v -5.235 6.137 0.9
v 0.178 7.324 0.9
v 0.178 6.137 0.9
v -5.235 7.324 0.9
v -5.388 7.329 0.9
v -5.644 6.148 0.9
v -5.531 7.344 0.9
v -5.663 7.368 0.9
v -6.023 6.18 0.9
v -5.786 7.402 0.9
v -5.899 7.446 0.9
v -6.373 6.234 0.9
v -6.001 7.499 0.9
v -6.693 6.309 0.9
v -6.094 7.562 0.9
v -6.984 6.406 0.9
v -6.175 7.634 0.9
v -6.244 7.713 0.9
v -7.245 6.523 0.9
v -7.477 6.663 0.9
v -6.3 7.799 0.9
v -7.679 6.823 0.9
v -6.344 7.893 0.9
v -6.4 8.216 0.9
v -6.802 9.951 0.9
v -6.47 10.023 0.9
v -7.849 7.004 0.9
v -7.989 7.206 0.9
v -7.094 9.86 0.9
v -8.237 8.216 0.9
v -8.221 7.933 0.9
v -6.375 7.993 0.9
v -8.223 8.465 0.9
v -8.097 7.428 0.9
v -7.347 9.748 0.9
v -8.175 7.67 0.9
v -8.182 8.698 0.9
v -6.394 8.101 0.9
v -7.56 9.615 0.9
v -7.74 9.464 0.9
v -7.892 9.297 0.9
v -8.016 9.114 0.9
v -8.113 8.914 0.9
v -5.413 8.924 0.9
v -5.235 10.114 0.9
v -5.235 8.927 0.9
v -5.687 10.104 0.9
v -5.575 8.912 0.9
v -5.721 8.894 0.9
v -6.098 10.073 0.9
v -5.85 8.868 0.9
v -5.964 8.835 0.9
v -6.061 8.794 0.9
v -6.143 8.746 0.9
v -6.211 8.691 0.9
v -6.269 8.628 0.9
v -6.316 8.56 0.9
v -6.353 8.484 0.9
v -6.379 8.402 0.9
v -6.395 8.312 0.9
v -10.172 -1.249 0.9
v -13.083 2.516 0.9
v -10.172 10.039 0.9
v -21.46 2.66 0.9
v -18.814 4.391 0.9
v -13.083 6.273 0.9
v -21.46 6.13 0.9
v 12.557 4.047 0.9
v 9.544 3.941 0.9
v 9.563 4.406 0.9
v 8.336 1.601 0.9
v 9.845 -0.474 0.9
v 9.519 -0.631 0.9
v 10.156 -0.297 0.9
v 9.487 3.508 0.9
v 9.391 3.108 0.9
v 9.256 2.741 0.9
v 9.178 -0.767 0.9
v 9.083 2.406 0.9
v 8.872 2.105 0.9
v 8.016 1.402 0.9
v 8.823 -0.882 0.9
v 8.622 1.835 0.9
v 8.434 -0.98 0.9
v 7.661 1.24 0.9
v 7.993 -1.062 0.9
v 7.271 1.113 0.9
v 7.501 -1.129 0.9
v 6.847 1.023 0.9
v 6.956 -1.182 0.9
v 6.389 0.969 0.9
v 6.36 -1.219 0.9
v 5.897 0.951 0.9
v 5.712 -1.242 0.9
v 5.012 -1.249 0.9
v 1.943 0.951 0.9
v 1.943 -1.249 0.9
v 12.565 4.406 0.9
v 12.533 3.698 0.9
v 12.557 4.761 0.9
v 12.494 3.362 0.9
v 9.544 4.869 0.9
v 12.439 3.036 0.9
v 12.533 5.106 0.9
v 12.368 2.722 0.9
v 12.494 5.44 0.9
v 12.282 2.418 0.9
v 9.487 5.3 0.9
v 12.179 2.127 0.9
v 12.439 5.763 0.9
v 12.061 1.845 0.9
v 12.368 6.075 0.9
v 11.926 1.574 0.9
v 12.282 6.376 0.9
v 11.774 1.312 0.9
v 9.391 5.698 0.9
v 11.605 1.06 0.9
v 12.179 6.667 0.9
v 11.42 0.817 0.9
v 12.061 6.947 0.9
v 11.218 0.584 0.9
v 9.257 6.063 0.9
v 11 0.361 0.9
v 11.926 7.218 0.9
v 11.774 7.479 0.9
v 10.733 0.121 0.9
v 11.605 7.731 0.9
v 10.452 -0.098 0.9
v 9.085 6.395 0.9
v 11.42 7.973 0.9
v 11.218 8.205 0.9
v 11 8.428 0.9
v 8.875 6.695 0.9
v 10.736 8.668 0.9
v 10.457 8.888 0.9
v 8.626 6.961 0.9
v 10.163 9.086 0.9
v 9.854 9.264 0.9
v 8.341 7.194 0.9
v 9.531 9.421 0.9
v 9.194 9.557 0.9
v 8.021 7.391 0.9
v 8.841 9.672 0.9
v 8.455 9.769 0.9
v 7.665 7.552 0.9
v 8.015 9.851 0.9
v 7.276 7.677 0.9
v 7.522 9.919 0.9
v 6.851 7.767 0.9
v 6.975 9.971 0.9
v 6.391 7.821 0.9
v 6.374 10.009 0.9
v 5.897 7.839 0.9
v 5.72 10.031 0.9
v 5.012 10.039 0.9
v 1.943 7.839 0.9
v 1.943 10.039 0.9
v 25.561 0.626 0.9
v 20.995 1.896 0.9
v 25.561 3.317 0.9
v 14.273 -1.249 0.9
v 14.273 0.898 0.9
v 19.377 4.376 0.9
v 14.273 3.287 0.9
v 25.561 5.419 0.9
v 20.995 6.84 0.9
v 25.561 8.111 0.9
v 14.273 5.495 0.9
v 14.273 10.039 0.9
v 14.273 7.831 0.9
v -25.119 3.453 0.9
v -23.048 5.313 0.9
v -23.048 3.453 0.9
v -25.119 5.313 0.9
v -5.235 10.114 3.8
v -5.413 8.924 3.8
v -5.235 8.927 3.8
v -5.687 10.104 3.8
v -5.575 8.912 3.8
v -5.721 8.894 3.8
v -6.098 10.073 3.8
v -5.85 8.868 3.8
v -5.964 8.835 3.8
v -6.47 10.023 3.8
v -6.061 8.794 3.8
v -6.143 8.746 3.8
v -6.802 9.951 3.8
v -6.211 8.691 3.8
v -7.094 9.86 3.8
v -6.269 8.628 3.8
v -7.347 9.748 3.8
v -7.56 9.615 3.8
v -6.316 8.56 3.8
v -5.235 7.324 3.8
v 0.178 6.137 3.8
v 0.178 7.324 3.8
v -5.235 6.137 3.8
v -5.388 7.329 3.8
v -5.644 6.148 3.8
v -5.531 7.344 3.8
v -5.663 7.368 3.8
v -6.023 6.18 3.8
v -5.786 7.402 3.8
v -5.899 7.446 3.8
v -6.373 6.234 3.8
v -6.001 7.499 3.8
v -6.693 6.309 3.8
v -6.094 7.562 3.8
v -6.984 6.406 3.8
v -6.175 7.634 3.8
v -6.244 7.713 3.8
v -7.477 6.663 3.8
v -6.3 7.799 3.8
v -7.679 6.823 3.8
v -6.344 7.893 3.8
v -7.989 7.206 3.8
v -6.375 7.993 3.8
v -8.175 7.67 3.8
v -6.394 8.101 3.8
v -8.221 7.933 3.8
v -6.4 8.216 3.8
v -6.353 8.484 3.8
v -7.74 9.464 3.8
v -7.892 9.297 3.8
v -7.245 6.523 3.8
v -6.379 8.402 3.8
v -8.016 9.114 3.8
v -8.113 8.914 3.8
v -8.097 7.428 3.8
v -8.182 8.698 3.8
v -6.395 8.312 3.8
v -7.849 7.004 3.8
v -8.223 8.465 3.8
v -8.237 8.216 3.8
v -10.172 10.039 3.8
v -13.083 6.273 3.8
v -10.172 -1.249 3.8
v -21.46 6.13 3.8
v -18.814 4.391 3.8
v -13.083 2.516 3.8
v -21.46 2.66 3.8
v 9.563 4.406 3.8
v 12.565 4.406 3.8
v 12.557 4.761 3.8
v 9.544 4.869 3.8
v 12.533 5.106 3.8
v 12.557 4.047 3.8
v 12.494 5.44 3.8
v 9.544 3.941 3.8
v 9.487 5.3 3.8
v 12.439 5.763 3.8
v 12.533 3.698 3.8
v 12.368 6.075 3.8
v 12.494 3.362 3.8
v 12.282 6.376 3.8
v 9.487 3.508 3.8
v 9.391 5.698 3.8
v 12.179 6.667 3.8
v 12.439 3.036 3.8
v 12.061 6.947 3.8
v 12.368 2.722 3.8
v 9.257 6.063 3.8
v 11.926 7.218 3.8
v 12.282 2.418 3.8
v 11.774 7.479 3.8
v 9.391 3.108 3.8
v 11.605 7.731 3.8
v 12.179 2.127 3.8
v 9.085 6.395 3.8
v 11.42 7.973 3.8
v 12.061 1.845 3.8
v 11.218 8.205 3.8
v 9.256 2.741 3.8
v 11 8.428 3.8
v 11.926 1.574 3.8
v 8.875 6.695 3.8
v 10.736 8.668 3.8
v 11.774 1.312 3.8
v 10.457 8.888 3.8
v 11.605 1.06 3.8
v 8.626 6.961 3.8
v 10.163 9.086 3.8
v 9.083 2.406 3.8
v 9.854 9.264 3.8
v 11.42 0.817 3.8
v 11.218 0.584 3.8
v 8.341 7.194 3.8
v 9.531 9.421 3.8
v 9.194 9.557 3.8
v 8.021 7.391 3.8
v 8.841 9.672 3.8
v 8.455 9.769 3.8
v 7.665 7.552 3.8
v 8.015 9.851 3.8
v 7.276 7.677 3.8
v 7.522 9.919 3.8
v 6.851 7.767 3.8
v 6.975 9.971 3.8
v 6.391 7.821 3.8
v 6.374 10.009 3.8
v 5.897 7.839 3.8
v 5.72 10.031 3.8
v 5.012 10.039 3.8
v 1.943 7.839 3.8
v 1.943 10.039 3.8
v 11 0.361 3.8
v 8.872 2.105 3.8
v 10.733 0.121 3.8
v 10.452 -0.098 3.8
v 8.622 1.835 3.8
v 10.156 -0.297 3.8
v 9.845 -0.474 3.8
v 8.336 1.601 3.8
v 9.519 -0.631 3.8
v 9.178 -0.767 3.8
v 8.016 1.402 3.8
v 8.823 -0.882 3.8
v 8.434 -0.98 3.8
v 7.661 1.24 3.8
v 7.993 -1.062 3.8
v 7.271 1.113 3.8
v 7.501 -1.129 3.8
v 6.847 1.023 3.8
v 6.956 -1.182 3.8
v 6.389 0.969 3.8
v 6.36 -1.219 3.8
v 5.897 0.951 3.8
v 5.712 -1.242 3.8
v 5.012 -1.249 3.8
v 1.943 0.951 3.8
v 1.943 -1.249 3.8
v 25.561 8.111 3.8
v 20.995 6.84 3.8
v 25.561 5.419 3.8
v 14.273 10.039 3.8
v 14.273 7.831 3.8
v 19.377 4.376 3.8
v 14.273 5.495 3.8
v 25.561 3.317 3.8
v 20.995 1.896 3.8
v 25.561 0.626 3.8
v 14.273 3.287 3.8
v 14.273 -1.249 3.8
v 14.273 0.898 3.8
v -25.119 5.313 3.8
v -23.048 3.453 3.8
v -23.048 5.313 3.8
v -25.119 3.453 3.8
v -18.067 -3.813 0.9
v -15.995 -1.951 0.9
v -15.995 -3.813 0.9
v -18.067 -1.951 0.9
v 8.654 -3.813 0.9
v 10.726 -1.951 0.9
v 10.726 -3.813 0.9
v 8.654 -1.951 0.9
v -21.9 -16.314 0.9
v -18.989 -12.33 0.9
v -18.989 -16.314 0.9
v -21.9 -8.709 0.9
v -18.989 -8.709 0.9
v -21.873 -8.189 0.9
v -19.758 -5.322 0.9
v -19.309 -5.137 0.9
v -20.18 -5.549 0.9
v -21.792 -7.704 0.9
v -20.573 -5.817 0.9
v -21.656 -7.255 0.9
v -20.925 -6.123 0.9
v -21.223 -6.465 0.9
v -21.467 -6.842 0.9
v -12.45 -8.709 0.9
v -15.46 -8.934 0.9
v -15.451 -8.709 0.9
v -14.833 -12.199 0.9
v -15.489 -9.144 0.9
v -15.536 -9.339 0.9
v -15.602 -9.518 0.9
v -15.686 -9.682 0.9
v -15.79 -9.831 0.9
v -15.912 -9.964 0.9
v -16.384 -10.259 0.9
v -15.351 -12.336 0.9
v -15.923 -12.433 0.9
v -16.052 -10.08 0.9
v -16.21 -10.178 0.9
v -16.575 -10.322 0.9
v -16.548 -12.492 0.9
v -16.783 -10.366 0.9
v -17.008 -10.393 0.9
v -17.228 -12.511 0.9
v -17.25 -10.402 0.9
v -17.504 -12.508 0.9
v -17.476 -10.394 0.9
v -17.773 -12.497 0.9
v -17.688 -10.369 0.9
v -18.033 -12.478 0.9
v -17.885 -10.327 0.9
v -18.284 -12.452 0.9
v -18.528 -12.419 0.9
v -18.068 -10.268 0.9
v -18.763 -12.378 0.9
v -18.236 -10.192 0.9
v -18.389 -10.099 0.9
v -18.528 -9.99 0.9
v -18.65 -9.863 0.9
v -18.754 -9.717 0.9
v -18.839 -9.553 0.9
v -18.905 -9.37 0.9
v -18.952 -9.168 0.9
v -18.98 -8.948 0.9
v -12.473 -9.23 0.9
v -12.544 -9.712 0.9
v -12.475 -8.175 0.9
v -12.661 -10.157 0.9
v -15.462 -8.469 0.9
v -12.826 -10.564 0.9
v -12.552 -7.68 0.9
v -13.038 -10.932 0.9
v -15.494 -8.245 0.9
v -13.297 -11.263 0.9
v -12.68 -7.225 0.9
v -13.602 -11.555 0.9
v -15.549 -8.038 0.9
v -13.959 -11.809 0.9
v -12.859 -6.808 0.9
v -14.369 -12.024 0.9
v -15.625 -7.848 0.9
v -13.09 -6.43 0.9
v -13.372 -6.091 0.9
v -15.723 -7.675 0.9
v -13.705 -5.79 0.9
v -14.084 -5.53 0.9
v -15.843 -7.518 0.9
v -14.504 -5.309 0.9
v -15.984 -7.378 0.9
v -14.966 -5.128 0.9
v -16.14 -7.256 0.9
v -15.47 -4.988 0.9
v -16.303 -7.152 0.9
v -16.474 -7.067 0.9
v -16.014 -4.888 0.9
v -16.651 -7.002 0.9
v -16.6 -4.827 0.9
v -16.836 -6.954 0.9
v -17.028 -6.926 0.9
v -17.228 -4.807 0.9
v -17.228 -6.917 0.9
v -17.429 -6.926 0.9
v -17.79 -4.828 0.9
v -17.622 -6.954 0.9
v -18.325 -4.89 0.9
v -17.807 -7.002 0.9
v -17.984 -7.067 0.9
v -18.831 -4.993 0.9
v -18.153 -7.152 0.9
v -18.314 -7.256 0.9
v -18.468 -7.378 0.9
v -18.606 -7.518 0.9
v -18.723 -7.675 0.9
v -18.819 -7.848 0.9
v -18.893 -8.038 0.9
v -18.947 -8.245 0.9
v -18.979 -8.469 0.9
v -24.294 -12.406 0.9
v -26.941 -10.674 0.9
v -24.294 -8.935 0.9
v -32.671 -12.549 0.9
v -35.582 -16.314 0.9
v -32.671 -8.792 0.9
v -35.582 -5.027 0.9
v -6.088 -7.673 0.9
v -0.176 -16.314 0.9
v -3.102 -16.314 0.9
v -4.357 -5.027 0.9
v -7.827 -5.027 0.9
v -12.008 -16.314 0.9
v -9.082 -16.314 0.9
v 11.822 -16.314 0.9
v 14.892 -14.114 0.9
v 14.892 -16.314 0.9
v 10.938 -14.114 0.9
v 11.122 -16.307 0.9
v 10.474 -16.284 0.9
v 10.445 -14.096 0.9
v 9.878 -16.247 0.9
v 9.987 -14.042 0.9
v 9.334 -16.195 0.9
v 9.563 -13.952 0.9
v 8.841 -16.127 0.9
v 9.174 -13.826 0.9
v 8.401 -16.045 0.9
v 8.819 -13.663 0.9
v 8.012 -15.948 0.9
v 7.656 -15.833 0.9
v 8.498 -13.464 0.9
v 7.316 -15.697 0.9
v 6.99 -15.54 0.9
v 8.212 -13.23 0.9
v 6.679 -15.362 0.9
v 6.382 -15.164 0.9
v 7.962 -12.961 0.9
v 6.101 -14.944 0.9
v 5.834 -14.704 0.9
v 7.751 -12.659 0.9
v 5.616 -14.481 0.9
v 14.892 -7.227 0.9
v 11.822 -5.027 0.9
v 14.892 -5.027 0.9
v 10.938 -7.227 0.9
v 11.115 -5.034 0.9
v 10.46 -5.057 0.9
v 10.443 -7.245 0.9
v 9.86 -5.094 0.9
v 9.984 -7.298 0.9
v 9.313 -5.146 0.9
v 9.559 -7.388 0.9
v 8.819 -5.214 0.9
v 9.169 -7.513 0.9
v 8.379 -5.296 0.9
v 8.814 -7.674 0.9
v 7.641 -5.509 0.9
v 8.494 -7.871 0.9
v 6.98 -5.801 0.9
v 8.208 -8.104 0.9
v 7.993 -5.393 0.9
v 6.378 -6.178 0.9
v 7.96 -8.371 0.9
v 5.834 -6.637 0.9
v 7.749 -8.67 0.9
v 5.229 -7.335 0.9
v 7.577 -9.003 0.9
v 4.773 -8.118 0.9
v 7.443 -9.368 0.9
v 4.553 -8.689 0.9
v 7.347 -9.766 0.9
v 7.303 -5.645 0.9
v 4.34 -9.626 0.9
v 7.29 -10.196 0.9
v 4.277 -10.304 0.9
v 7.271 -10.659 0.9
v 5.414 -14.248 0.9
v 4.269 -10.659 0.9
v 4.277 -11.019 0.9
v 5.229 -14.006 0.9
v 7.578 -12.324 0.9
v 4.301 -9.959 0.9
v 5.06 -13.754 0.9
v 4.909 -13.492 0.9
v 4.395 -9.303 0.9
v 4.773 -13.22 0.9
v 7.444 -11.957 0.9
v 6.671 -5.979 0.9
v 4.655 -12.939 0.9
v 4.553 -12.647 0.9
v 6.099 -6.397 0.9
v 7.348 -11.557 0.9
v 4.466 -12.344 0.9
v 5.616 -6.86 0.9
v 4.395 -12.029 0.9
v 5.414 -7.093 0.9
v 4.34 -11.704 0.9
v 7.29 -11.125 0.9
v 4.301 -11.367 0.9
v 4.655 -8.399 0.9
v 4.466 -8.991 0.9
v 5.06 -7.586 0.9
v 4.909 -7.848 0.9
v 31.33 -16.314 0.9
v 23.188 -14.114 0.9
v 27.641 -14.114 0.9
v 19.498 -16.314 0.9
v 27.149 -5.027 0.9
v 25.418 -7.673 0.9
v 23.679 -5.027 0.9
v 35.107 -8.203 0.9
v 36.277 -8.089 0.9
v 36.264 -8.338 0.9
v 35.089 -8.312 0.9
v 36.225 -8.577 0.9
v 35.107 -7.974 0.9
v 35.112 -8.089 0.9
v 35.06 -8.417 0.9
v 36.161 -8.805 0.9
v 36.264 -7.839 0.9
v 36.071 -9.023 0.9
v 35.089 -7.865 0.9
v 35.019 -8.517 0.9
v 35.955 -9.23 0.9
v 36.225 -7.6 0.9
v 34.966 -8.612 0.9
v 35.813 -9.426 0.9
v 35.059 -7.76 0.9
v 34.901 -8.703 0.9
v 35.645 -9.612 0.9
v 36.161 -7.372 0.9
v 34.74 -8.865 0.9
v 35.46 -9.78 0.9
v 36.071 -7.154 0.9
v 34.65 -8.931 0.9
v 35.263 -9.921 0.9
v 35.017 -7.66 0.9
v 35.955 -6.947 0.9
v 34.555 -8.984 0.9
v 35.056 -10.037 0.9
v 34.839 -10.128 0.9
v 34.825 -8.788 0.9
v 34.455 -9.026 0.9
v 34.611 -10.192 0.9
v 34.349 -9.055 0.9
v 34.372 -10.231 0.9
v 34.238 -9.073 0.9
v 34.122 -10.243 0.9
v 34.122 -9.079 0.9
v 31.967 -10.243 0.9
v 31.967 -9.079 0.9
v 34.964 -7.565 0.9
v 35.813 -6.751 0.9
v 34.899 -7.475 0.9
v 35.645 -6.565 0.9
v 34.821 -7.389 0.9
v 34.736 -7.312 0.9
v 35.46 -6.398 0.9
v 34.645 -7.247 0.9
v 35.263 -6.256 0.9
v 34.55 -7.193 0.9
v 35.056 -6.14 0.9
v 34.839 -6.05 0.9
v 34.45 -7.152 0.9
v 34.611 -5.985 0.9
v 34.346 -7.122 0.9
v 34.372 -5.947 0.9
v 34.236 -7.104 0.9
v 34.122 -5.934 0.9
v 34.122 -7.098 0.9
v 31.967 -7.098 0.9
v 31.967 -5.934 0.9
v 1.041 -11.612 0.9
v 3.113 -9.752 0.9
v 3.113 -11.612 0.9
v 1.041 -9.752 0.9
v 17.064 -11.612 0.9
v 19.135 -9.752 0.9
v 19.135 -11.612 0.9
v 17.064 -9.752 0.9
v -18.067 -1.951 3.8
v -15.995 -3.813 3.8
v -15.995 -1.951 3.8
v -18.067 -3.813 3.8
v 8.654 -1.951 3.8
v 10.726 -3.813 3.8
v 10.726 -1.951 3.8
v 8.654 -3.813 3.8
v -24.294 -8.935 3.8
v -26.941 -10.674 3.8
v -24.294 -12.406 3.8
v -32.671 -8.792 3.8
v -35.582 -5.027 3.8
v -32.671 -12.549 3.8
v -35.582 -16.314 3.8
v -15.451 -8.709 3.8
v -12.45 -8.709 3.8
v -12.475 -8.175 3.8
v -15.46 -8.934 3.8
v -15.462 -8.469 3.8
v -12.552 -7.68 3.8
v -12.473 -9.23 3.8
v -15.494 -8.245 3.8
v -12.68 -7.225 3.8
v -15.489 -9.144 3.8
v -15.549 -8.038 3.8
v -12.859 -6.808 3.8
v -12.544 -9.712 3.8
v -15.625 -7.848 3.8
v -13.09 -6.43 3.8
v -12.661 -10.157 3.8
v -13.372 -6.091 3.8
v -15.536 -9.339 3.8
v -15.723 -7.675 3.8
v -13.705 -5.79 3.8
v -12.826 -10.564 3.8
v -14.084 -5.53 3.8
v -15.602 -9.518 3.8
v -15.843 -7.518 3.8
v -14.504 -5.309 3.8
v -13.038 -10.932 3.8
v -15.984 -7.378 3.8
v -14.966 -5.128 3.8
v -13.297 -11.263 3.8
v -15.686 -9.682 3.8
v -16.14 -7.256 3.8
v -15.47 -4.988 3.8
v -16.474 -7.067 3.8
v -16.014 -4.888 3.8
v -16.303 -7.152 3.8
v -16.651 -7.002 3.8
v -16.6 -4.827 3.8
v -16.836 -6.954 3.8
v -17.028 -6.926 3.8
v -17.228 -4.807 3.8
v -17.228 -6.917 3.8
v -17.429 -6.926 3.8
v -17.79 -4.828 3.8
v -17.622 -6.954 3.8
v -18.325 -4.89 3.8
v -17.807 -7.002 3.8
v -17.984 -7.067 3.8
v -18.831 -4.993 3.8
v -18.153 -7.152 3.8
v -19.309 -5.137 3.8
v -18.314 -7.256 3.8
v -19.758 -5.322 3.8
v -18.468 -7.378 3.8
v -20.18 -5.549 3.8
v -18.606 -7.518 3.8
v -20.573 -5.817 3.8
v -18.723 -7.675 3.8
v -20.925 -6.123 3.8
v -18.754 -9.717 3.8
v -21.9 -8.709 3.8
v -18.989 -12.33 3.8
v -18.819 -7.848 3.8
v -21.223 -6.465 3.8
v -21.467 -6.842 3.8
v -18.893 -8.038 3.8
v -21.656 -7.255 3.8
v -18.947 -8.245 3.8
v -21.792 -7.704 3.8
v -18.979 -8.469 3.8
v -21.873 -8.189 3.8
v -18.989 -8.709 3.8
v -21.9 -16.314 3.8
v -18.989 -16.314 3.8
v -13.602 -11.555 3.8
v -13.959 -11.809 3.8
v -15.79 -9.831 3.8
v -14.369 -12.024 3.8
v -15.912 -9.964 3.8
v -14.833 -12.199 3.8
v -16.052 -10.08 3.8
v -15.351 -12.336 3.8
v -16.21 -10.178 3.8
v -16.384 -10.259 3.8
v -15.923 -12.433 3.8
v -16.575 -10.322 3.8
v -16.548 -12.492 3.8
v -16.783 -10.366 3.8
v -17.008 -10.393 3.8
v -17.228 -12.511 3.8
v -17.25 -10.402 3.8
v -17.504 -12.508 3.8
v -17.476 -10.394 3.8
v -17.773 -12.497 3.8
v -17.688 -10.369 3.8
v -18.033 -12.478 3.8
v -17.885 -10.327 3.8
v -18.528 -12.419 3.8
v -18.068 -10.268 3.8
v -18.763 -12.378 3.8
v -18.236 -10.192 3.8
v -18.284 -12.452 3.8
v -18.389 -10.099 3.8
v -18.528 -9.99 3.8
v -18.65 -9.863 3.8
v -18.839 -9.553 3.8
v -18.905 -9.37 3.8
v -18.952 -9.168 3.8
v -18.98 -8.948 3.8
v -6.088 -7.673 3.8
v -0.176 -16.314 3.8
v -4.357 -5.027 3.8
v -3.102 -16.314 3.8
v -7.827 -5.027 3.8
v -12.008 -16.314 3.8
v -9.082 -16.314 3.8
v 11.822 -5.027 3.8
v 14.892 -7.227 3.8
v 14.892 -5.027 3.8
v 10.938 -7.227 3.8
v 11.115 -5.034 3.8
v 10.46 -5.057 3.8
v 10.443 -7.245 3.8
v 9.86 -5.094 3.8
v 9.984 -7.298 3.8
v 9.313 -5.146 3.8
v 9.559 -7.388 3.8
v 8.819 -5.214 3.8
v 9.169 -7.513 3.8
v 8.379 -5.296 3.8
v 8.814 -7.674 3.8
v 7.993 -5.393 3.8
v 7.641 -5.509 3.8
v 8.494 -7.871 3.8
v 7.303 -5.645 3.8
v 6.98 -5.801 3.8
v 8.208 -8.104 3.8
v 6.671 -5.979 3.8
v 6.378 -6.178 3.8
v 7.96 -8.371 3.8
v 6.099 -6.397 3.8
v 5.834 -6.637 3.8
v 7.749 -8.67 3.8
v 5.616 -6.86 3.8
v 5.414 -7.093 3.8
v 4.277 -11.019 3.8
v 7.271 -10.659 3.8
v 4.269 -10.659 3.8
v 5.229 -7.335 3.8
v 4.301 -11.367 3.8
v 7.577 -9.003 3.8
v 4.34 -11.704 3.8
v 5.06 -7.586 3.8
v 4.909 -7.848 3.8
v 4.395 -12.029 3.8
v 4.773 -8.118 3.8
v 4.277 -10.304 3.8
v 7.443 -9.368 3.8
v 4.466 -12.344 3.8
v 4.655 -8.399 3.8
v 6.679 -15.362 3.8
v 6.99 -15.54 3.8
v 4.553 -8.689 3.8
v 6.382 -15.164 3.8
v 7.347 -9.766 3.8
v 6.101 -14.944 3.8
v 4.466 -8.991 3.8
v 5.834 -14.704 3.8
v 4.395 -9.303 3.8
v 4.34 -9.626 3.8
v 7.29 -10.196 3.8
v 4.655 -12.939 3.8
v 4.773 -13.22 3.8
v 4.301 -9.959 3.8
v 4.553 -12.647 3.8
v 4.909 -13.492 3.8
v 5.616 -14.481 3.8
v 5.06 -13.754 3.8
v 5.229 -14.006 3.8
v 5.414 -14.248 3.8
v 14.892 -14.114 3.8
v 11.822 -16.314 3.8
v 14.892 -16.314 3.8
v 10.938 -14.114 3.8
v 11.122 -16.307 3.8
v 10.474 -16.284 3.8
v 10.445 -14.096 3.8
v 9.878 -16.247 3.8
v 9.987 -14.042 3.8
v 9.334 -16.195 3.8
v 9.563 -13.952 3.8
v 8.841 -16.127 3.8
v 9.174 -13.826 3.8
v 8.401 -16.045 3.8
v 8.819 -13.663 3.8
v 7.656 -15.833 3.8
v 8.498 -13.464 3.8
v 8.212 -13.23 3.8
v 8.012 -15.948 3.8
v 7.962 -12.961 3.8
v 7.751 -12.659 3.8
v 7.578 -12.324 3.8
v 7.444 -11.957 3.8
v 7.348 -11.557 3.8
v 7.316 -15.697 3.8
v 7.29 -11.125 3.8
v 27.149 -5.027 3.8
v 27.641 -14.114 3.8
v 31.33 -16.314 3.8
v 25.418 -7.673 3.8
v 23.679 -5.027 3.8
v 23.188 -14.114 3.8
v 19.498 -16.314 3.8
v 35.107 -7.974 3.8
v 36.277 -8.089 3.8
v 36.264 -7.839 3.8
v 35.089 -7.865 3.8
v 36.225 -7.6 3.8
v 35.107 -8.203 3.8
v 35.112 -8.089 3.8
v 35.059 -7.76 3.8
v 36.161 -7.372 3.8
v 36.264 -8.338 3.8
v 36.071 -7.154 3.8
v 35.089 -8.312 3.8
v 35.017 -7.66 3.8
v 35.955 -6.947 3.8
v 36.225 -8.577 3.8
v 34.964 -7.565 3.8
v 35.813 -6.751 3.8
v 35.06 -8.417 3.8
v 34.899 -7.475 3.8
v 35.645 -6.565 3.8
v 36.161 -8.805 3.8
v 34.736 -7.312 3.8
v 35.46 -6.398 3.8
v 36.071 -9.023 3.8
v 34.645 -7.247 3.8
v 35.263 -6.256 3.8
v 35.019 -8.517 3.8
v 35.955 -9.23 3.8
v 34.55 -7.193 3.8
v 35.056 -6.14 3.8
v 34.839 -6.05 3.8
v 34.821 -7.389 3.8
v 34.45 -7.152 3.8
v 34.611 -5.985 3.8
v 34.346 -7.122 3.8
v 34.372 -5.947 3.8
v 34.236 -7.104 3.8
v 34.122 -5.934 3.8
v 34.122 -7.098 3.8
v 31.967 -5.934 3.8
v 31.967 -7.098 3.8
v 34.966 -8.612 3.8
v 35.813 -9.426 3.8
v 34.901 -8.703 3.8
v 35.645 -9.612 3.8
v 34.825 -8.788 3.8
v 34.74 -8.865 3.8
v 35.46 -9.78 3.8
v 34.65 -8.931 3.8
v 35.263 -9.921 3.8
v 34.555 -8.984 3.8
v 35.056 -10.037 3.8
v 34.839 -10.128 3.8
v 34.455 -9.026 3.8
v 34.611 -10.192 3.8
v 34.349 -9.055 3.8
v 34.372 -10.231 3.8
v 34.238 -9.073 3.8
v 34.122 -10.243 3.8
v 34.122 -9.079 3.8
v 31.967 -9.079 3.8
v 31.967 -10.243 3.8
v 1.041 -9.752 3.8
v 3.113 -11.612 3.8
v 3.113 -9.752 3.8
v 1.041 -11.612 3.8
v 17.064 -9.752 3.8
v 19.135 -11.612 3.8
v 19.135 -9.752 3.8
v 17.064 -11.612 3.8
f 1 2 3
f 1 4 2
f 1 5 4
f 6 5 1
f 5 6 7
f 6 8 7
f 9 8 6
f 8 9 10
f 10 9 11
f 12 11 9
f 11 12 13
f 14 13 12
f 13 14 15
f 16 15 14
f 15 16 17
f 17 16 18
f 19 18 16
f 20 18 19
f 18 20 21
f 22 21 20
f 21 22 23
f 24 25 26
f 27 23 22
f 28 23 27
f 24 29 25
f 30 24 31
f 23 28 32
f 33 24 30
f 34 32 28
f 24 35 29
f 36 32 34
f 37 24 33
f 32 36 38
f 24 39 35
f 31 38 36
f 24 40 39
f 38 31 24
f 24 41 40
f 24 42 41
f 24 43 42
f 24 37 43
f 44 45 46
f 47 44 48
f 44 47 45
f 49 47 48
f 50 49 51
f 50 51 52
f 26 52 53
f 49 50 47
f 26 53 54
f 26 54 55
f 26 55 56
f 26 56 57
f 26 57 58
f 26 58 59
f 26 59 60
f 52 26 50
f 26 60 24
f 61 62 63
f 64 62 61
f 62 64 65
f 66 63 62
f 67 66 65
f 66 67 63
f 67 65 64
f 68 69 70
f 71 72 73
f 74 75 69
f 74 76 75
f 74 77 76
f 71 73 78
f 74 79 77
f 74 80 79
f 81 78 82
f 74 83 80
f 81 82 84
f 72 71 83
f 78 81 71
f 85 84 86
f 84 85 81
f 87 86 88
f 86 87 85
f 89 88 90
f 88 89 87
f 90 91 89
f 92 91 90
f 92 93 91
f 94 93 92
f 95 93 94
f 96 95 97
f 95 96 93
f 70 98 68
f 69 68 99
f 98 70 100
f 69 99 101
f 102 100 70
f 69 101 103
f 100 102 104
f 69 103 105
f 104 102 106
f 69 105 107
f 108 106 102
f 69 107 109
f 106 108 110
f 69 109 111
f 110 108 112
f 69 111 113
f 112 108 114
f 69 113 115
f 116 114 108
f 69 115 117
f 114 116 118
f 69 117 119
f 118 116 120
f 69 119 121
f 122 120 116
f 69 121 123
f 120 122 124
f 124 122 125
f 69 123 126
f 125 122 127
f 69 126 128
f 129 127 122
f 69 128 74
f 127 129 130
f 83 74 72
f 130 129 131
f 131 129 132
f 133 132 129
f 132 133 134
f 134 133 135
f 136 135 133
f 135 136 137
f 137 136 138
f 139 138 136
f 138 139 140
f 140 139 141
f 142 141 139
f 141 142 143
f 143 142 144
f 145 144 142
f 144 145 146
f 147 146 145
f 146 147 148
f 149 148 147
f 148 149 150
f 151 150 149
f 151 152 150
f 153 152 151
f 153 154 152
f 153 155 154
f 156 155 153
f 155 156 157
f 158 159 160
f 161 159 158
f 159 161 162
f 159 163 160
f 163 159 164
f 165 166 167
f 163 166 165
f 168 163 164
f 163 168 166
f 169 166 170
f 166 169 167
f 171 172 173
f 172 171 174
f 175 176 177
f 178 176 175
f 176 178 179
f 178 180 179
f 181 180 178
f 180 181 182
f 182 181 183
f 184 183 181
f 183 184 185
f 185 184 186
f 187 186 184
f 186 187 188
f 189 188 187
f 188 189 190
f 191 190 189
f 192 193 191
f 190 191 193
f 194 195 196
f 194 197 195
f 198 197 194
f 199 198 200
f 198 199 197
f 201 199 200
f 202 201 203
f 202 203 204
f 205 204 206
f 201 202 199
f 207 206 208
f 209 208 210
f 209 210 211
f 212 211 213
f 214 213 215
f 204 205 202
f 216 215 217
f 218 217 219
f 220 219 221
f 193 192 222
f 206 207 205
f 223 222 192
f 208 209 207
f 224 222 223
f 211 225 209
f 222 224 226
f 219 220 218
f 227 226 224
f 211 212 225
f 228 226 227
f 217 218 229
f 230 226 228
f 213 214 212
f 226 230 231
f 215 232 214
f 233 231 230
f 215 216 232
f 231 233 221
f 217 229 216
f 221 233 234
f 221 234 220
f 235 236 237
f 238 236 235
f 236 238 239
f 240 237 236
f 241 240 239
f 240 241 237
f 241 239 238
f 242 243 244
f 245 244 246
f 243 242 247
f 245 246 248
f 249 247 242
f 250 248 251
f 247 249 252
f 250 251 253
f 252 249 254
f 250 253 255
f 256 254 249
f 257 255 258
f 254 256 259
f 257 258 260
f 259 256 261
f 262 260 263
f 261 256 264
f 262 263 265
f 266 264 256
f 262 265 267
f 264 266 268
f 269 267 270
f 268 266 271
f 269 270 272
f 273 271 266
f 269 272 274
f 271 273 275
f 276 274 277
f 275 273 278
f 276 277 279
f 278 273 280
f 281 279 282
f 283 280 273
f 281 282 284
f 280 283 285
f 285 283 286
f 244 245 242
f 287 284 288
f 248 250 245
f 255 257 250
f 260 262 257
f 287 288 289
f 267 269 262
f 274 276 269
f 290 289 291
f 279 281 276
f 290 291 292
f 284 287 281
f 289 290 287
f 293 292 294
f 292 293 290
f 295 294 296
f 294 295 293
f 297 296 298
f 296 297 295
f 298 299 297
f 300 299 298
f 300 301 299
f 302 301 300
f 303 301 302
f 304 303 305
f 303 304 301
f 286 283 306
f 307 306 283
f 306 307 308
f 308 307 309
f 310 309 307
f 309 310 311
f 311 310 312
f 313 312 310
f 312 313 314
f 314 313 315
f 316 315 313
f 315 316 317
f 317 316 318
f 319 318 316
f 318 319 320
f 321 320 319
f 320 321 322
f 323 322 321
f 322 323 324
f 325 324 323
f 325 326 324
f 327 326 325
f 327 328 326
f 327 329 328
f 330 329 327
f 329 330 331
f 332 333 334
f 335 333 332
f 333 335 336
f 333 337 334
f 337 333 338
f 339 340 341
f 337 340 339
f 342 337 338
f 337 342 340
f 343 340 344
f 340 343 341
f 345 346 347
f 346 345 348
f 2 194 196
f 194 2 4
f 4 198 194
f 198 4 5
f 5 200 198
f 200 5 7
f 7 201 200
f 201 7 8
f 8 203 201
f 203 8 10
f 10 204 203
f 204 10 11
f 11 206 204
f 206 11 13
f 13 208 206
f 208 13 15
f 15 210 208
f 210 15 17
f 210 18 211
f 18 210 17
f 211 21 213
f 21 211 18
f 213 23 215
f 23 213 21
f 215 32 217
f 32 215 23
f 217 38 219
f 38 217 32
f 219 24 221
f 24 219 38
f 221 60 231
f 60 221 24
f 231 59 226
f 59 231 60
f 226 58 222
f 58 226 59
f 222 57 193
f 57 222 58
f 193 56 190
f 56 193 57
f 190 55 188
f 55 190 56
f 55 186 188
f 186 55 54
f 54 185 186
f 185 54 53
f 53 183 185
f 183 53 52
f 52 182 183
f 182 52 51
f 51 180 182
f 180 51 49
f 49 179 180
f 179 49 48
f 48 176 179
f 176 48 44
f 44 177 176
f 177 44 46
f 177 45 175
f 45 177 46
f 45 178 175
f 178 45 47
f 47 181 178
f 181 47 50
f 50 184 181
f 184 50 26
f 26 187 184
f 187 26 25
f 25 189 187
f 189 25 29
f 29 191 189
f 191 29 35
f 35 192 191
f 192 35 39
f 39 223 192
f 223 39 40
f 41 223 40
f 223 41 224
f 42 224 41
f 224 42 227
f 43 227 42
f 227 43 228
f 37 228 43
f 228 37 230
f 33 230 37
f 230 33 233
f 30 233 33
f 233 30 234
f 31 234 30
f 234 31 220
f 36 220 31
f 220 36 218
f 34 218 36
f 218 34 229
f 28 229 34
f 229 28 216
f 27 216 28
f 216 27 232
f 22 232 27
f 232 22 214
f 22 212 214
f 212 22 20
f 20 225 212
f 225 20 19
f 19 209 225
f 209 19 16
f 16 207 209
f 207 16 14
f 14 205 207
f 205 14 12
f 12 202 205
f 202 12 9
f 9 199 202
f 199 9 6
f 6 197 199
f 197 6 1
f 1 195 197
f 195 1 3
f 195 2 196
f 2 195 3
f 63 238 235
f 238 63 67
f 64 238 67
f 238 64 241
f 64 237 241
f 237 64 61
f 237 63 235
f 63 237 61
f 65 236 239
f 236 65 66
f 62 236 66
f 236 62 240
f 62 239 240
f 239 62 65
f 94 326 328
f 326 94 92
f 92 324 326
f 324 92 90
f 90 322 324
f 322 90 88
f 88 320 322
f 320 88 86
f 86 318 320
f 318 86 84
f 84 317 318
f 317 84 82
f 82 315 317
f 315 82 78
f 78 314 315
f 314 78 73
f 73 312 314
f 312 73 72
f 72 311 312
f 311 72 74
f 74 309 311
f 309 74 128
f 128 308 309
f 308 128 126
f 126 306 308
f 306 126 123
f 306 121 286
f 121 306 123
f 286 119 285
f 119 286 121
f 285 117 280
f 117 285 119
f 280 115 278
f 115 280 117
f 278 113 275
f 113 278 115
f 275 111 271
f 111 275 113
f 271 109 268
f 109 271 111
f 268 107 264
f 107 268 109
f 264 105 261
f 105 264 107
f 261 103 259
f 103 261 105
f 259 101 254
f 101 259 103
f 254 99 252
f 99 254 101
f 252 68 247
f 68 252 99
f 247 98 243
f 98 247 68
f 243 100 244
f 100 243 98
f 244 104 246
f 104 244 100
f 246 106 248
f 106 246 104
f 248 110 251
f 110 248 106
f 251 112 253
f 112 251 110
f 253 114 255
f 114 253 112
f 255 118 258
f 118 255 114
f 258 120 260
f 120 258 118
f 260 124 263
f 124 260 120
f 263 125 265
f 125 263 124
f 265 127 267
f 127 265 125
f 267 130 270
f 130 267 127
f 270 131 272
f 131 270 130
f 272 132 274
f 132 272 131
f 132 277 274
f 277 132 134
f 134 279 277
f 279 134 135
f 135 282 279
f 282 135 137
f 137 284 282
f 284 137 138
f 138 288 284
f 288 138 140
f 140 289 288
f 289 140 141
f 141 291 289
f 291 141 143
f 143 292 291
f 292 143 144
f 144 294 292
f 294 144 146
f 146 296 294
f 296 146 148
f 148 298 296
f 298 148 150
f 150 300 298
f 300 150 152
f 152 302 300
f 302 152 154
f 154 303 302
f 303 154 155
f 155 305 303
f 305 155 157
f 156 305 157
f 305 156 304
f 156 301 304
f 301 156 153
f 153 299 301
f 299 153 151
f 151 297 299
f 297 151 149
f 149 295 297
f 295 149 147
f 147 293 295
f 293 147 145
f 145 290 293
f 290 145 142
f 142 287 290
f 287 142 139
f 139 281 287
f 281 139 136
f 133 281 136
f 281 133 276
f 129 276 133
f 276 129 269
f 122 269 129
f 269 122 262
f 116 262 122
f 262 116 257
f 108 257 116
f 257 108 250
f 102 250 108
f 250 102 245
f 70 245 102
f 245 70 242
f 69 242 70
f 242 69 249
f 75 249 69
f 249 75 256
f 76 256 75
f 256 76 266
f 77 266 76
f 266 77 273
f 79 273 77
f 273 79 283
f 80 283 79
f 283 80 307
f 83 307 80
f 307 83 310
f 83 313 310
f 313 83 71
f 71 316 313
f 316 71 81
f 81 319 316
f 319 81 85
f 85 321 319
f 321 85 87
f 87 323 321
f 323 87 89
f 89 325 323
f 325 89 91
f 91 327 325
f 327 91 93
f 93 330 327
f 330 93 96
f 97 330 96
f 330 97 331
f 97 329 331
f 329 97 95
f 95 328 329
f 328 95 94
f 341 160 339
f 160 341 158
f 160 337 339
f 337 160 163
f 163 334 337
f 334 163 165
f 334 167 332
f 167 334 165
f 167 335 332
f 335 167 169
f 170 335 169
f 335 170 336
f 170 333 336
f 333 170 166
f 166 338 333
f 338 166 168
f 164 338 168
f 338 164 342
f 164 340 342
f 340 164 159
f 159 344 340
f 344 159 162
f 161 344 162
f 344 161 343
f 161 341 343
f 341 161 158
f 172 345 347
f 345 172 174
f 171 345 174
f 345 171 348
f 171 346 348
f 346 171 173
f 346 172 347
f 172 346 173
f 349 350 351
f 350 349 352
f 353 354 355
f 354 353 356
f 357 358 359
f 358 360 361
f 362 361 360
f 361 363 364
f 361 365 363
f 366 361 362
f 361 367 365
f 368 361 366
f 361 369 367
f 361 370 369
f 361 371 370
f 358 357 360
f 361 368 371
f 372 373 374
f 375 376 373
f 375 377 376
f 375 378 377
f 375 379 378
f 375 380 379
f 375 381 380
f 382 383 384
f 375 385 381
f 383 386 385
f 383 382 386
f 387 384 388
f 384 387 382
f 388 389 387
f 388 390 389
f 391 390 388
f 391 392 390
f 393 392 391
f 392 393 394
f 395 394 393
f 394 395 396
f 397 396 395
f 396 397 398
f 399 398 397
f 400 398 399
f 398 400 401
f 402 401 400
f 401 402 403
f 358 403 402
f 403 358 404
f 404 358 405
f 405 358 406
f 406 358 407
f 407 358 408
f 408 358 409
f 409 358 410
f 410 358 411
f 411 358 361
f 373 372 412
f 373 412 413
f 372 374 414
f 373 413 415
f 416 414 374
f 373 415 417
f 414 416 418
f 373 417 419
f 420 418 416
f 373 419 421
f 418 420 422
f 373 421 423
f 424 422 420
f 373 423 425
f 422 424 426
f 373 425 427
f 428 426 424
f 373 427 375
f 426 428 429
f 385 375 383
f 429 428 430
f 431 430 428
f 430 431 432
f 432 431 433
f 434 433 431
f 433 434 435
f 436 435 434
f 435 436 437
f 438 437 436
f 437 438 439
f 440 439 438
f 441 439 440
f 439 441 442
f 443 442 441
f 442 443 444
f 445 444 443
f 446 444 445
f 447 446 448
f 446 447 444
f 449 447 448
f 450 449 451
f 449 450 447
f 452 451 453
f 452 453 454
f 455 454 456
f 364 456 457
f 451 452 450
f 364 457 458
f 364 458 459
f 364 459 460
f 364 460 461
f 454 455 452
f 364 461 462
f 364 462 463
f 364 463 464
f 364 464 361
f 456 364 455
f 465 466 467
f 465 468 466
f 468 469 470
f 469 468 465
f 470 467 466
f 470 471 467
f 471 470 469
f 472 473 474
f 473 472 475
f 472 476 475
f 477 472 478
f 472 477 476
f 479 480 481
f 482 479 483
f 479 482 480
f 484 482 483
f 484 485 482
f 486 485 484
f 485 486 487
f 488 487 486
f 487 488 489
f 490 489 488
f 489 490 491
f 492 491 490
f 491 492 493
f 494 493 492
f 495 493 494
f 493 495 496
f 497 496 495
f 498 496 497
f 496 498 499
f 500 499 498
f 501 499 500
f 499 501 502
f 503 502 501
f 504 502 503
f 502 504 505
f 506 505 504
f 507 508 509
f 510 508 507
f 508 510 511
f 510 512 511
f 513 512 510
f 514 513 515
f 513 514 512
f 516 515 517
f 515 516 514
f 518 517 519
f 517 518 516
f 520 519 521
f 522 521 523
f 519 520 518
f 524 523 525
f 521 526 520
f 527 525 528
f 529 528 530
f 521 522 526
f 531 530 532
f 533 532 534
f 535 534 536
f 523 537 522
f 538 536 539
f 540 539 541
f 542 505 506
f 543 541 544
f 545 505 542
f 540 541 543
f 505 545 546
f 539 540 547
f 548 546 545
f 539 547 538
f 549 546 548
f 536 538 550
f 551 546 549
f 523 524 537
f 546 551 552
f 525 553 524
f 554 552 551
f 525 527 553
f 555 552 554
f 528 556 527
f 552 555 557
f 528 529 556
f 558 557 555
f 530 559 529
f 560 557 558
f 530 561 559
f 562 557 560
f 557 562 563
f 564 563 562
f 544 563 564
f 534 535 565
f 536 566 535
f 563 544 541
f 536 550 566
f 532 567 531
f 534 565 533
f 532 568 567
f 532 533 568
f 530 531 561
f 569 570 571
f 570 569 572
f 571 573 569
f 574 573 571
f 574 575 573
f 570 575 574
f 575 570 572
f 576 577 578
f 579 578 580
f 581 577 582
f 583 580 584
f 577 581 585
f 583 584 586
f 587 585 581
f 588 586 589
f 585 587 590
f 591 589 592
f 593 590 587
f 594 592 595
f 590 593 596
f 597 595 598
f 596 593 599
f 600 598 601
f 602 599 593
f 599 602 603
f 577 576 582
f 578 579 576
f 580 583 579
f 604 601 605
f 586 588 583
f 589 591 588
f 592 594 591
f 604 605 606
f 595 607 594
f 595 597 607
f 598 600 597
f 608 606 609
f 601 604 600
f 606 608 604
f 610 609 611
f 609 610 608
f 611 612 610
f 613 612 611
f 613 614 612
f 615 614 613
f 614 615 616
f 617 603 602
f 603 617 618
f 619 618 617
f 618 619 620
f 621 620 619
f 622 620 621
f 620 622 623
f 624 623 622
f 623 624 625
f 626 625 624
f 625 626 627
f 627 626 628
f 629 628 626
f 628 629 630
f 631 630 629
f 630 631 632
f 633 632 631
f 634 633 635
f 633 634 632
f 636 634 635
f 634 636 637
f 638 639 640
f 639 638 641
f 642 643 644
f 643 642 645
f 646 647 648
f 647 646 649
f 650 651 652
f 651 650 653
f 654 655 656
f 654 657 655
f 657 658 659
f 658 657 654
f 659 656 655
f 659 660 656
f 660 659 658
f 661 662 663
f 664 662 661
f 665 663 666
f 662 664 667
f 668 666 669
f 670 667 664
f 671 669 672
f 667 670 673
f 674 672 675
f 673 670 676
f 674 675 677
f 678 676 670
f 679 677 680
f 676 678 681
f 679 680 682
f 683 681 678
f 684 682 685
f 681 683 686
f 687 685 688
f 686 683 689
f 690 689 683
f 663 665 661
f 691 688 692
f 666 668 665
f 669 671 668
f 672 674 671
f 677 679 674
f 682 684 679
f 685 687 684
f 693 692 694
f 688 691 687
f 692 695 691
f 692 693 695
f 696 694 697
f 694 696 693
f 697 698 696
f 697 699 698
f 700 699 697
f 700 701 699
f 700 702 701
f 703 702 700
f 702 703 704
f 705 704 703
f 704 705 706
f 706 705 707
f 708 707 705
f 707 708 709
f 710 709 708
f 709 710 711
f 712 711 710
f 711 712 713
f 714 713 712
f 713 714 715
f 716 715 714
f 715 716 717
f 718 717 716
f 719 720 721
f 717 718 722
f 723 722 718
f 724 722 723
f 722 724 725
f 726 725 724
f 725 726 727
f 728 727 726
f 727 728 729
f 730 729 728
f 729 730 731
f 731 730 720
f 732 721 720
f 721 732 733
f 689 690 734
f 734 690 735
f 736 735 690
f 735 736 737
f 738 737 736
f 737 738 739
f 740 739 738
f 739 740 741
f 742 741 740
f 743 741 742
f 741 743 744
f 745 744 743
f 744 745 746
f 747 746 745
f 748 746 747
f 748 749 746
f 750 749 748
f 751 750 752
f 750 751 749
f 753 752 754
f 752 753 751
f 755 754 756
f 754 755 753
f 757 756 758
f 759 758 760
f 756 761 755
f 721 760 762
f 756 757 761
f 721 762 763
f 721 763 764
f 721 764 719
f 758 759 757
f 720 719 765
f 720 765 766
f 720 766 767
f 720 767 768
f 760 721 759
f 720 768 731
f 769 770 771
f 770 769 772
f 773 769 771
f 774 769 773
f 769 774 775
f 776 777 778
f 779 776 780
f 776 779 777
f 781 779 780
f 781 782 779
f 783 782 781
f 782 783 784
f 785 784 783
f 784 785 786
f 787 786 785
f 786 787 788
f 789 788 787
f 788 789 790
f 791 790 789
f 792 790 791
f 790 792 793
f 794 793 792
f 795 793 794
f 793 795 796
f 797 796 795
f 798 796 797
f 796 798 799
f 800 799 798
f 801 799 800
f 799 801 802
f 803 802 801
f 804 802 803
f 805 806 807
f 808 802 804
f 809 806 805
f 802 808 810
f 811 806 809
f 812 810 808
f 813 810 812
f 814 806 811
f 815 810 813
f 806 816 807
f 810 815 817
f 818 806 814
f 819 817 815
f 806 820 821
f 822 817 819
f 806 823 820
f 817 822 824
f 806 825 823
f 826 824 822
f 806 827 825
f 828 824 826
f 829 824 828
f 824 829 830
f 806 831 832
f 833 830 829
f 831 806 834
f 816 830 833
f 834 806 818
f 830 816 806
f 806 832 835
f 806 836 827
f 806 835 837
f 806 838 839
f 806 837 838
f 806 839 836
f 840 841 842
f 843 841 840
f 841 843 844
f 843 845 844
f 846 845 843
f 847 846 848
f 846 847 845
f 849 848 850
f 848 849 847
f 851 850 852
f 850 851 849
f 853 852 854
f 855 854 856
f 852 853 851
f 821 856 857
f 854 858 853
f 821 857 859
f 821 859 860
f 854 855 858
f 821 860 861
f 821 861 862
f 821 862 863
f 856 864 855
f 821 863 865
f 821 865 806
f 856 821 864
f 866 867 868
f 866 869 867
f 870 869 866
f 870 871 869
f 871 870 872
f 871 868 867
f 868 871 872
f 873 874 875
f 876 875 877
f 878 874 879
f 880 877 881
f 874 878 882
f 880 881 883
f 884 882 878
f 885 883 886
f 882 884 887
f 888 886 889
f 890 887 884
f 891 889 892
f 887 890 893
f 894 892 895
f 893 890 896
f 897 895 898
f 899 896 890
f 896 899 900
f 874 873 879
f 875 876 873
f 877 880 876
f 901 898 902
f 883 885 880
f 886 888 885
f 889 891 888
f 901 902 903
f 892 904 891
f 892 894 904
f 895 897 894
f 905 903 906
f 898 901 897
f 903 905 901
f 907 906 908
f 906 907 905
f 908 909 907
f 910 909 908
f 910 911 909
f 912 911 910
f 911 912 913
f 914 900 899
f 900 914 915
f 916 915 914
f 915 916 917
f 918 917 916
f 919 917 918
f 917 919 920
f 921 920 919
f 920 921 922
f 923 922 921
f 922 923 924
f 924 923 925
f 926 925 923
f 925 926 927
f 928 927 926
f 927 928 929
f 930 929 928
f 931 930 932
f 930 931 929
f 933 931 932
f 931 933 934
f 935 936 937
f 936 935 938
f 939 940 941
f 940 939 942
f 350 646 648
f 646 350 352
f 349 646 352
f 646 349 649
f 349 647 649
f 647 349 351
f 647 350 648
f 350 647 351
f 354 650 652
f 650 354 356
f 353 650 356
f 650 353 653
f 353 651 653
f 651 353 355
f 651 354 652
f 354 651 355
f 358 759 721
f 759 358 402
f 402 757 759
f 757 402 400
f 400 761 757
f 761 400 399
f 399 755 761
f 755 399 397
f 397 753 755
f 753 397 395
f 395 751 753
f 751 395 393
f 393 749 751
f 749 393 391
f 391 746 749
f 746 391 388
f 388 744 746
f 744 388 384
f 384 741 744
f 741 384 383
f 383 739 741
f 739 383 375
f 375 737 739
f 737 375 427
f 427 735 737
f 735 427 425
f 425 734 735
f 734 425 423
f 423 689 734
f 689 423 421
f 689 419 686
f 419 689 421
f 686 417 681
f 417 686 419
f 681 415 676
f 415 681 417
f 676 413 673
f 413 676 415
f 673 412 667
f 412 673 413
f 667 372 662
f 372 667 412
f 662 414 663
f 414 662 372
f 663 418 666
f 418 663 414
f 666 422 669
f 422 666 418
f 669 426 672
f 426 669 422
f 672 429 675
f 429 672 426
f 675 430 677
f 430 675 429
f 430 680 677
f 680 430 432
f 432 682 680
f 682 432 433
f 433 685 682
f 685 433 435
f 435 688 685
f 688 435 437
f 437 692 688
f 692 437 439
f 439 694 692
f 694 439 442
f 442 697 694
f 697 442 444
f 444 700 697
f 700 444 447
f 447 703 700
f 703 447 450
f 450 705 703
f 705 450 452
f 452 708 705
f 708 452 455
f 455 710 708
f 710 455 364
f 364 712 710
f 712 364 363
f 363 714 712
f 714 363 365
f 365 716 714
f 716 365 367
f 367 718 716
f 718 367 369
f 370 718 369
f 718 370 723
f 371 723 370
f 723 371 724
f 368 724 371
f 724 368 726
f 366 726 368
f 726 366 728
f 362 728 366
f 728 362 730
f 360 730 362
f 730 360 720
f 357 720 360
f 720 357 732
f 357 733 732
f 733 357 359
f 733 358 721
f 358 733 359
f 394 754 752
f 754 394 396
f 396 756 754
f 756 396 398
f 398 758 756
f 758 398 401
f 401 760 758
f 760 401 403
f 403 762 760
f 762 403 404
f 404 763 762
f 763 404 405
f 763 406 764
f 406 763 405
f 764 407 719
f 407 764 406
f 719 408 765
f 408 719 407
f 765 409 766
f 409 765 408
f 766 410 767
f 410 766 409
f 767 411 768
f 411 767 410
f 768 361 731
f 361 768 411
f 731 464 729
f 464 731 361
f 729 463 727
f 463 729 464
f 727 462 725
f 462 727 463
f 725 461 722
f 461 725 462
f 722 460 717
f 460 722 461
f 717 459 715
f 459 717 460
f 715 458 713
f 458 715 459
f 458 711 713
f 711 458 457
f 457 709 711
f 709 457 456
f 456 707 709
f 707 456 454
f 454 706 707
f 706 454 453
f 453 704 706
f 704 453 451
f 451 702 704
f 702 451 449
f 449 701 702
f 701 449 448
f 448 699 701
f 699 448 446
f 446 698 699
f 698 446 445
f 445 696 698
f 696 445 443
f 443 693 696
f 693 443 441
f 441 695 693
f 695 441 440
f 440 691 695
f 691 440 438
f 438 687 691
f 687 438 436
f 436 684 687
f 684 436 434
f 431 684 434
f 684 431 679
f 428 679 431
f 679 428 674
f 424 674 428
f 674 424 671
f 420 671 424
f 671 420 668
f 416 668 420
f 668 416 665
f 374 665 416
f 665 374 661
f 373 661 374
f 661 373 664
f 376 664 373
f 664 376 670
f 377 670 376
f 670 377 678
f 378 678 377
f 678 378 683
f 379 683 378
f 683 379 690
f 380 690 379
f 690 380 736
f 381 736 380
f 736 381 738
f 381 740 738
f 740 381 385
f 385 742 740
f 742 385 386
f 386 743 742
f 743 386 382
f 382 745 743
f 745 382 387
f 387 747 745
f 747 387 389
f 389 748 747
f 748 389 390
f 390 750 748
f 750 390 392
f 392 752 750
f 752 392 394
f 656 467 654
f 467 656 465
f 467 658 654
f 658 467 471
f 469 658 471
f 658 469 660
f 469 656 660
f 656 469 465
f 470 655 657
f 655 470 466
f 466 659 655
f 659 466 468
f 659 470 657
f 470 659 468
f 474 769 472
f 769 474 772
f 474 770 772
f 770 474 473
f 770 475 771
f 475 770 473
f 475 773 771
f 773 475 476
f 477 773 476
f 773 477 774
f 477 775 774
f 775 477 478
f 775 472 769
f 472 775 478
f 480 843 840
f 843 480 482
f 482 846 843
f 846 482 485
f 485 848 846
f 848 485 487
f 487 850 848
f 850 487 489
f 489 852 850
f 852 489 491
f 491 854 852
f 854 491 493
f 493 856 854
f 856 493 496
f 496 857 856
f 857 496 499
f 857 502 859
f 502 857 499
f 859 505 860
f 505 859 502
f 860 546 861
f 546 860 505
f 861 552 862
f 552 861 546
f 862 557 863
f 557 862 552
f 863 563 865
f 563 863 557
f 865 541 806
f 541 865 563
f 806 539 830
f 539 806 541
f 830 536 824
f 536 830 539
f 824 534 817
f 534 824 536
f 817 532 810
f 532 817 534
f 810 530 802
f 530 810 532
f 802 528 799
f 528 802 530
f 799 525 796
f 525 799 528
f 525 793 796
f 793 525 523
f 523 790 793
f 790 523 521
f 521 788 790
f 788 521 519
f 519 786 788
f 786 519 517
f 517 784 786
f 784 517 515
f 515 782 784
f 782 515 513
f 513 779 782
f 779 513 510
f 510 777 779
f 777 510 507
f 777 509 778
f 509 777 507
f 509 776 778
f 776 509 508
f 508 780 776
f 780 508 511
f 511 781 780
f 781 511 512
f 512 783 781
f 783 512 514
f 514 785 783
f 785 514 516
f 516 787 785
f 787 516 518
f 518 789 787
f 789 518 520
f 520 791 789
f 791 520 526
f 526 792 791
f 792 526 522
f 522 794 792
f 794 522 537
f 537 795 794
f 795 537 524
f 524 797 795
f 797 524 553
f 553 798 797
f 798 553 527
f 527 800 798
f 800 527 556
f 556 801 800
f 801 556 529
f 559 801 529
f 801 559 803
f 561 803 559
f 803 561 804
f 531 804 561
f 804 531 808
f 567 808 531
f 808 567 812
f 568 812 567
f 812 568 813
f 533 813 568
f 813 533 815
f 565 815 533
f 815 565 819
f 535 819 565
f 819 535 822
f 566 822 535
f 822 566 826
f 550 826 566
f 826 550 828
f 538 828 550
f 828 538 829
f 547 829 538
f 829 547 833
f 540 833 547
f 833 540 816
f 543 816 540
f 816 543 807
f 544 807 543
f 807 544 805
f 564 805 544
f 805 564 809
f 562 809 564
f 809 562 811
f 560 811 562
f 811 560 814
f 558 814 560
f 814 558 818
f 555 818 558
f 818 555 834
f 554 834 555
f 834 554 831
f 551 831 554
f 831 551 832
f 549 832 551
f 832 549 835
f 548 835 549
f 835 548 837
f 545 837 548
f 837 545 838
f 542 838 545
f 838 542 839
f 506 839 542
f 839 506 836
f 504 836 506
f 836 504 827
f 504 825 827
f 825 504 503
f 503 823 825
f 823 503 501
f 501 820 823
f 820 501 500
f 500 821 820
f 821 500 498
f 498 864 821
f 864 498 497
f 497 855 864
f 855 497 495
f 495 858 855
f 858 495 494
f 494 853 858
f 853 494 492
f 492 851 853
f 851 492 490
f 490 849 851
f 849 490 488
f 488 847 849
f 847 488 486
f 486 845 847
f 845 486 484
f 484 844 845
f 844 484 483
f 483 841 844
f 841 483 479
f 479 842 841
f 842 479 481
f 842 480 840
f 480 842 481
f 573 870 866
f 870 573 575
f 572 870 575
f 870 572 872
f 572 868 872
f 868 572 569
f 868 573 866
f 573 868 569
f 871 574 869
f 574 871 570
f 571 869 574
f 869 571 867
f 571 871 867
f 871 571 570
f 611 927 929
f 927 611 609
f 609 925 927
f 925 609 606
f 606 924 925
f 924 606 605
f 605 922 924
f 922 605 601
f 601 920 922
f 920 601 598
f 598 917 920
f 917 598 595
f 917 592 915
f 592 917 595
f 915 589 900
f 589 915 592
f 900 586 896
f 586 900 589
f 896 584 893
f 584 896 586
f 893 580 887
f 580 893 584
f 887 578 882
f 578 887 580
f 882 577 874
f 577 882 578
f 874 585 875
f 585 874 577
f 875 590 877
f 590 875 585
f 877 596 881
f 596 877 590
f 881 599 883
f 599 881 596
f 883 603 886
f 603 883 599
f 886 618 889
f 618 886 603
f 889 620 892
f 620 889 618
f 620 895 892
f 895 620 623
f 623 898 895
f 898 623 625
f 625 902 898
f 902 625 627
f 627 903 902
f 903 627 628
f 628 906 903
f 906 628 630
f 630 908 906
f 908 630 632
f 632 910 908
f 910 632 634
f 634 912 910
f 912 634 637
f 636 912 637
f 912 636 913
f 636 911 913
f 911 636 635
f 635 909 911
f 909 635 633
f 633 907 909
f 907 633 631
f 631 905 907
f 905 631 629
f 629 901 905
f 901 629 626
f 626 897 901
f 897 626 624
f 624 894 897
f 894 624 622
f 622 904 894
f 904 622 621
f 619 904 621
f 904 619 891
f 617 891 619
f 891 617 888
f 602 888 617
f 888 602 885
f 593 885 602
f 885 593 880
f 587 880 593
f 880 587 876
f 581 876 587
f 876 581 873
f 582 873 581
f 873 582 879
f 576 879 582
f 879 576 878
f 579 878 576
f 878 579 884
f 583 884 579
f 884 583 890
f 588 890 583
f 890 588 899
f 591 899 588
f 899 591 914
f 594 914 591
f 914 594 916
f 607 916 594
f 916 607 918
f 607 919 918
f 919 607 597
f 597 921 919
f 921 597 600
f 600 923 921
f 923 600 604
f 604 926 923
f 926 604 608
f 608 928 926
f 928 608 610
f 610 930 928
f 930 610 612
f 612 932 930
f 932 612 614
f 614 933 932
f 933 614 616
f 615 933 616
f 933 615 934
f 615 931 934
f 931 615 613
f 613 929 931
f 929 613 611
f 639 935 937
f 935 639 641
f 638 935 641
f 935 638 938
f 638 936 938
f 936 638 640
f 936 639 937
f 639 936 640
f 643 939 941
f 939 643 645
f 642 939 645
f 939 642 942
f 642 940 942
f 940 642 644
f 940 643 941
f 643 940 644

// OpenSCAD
$fn = 48;
  // syllabics (overlaid on icon, tallest)
  translate([0, 4.301, 0.900]) linear_extrude(height=2.900) text("ᐗᓪᑐᕒ", size=11.149, halign="center", valign="center", font="Euphemia UCAS:style=Bold");
  translate([0, -9.301, 0.900]) linear_extrude(height=2.900) text("ᐅᑮᐱᑣᐎᐣ", size=11.149, halign="center", valign="center", font="Euphemia UCAS:style=Bold");
